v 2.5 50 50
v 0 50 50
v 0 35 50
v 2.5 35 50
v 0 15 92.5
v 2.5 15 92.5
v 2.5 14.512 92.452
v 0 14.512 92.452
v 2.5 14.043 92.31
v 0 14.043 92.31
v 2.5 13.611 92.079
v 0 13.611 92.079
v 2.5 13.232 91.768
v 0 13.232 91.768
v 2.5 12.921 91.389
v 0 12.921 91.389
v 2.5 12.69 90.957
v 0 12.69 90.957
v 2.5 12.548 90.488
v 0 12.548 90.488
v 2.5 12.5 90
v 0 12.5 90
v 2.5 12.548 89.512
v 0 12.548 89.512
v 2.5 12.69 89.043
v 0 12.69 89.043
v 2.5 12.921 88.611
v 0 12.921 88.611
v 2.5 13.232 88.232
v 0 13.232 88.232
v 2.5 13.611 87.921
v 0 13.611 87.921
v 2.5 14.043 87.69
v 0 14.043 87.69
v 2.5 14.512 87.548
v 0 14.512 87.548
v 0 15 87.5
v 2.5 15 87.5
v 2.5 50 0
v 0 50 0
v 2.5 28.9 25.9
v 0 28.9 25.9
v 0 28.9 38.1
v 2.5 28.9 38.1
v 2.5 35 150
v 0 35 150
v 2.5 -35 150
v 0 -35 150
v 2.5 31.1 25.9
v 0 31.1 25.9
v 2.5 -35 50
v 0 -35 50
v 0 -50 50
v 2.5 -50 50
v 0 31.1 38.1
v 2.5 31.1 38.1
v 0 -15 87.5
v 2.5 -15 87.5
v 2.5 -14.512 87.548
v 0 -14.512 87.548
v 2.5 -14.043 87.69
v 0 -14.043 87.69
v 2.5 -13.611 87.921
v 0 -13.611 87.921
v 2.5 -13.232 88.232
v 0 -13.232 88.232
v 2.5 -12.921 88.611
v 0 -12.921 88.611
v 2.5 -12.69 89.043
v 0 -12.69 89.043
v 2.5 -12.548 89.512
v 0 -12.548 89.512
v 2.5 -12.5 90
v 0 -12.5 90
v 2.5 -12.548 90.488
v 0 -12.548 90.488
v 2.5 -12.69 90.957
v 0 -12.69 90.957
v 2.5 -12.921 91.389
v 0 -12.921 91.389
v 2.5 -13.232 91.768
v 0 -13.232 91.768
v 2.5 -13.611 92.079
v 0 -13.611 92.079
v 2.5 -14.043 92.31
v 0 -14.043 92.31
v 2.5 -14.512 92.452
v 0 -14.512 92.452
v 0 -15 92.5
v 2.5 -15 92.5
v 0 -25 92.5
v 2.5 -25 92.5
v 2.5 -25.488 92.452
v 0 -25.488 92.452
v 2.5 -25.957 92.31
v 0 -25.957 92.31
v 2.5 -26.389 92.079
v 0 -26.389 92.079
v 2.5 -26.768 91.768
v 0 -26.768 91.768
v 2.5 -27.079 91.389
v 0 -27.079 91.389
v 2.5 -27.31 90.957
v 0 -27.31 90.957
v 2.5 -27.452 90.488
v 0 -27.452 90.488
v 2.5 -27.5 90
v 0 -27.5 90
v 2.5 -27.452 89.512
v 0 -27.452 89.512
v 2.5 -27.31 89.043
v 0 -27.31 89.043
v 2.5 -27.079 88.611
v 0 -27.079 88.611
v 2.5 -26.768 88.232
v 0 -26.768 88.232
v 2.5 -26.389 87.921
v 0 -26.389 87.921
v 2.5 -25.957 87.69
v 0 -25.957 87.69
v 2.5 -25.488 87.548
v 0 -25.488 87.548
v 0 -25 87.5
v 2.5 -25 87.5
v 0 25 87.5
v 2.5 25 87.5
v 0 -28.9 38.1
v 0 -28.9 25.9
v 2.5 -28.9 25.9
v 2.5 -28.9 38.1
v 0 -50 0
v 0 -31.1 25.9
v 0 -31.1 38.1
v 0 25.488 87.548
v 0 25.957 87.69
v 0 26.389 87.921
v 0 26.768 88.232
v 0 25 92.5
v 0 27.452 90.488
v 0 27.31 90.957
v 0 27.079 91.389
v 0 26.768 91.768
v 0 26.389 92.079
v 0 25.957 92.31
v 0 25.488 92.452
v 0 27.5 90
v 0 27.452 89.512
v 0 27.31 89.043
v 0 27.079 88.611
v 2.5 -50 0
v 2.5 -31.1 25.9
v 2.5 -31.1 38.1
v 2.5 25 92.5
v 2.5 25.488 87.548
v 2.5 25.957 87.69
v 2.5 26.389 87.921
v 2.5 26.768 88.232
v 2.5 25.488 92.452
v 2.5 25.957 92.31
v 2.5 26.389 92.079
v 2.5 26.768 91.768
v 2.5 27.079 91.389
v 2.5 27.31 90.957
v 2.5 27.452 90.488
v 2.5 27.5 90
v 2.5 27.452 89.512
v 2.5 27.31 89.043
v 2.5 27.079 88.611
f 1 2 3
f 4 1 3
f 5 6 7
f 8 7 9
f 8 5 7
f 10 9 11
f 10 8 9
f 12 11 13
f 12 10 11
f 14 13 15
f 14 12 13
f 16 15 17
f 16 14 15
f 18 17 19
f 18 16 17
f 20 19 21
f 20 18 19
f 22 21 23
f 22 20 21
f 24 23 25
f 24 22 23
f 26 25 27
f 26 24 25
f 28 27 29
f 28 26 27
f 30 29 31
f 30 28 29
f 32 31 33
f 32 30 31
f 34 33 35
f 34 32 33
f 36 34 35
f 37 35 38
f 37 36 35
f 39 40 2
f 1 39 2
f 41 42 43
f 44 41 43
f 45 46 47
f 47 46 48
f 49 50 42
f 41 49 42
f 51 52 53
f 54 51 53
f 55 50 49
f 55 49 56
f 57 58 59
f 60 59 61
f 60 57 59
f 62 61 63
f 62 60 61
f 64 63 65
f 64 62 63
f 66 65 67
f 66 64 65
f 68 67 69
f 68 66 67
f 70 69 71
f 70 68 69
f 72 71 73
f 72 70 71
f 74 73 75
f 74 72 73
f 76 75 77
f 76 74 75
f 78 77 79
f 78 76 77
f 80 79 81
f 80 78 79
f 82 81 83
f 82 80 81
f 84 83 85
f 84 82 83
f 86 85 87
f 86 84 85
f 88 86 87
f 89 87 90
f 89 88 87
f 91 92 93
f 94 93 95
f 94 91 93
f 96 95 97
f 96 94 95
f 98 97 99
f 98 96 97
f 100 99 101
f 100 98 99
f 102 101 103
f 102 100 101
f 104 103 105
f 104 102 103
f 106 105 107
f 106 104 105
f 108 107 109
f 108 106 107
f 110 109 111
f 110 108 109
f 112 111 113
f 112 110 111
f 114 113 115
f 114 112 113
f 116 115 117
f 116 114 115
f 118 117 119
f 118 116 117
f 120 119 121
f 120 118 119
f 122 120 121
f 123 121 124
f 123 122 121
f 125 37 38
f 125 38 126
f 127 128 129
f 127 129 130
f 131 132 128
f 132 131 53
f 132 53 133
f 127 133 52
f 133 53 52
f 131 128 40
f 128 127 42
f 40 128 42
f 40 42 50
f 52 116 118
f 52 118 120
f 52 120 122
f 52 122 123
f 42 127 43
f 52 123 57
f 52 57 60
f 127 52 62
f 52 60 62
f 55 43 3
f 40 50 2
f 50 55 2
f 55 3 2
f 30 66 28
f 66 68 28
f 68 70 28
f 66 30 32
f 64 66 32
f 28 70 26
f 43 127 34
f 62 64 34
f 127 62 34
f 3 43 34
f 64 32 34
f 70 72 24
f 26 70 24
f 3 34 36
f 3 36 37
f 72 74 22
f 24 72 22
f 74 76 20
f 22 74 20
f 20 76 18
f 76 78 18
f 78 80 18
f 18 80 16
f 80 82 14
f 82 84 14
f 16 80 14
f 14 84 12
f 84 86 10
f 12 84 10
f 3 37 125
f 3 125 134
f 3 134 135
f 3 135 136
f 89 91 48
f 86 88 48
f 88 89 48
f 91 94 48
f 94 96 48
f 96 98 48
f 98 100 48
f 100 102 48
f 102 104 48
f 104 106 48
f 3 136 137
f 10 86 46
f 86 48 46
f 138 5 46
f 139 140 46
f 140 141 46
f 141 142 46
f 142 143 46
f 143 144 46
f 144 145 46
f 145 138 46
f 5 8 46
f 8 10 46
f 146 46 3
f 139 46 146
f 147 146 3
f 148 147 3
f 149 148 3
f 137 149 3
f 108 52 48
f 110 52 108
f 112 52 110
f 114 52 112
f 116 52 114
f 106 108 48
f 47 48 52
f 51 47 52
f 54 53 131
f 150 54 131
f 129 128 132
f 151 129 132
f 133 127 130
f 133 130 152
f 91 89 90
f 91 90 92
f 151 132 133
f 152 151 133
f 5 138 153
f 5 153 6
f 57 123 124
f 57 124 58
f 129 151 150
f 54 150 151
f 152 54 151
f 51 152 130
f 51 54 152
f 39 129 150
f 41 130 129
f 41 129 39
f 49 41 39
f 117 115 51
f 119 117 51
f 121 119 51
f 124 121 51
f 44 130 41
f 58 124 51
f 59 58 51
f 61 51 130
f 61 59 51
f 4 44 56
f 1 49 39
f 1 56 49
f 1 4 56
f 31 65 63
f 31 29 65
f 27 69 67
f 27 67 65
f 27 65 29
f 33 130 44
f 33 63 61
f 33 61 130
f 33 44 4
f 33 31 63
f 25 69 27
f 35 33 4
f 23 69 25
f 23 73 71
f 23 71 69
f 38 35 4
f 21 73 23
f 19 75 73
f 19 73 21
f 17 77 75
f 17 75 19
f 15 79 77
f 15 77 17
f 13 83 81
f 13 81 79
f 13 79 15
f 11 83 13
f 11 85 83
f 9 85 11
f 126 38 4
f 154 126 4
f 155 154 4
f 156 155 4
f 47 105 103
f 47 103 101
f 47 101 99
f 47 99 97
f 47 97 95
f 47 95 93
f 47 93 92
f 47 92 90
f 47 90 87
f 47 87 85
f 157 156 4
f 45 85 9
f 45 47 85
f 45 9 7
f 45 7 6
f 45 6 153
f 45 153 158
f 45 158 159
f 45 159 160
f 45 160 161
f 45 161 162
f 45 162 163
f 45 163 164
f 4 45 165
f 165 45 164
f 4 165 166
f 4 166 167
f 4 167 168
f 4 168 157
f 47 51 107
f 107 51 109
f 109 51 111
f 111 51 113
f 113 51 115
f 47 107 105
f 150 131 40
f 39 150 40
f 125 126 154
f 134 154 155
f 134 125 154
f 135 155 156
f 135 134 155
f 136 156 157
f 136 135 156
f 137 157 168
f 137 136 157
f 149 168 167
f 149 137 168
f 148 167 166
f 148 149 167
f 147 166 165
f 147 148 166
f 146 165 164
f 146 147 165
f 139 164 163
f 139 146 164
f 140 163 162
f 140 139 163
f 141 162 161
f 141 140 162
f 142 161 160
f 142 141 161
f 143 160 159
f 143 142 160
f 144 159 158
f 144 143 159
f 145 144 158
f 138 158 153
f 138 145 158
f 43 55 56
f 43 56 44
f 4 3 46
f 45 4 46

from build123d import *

# Parameters (mm, degrees)
BOSS_EXTRUDE1_DEPTH = 2.5
SKETCH4_W           = 2.2
SKETCH4_H           = 12.2
CUT_EXTRUDE1_DEPTH  = 159.133646009
CUT_EXTRUDE2_DEPTH  = 159.133646009


with BuildPart() as part:
    # Sketch1 → Boss-Extrude1 (new body)
    with BuildSketch(Plane.YZ):
        Polygon((50, 0), (50, 50), (35, 50), (35, 150), (-35, 150), (-35, 50), (-50, 50), (-50, 0), (0, 0), align=None)
    extrude(amount=BOSS_EXTRUDE1_DEPTH)

    # Sketch4 → Cut-Extrude1 (cut, through all)
    with BuildSketch(Plane(origin=(0, 0, 0), x_dir=(0, -1, 0), z_dir=(-1, 0, 0))):
        with Locations((-30, 32)):
            Rectangle(SKETCH4_W, SKETCH4_H)
        with Locations((30, 32)):
            Rectangle(SKETCH4_W, SKETCH4_H)
    extrude(amount=-CUT_EXTRUDE1_DEPTH, mode=Mode.SUBTRACT)

    # Sketch6 → Cut-Extrude2 (cut, through all)
    with BuildSketch(Plane(origin=(0, 0, 0), x_dir=(0, -1, 0), z_dir=(-1, 0, 0))):
        with BuildLine():
            Line((-25, 92.5), (-15, 92.5))
            ThreePointArc((-15, 92.5), (-12.5, 90), (-15, 87.5))
            Line((-15, 87.5), (-25, 87.5))
            ThreePointArc((-25, 87.5), (-27.5, 90), (-25, 92.5))
        make_face()
        with BuildLine():
            Line((15, 92.5), (25, 92.5))
            ThreePointArc((25, 92.5), (27.5, 90), (25, 87.5))
            Line((25, 87.5), (15, 87.5))
            ThreePointArc((15, 87.5), (12.5, 90), (15, 92.5))
        make_face()
    extrude(amount=-CUT_EXTRUDE2_DEPTH, mode=Mode.SUBTRACT)


solid = part.part
